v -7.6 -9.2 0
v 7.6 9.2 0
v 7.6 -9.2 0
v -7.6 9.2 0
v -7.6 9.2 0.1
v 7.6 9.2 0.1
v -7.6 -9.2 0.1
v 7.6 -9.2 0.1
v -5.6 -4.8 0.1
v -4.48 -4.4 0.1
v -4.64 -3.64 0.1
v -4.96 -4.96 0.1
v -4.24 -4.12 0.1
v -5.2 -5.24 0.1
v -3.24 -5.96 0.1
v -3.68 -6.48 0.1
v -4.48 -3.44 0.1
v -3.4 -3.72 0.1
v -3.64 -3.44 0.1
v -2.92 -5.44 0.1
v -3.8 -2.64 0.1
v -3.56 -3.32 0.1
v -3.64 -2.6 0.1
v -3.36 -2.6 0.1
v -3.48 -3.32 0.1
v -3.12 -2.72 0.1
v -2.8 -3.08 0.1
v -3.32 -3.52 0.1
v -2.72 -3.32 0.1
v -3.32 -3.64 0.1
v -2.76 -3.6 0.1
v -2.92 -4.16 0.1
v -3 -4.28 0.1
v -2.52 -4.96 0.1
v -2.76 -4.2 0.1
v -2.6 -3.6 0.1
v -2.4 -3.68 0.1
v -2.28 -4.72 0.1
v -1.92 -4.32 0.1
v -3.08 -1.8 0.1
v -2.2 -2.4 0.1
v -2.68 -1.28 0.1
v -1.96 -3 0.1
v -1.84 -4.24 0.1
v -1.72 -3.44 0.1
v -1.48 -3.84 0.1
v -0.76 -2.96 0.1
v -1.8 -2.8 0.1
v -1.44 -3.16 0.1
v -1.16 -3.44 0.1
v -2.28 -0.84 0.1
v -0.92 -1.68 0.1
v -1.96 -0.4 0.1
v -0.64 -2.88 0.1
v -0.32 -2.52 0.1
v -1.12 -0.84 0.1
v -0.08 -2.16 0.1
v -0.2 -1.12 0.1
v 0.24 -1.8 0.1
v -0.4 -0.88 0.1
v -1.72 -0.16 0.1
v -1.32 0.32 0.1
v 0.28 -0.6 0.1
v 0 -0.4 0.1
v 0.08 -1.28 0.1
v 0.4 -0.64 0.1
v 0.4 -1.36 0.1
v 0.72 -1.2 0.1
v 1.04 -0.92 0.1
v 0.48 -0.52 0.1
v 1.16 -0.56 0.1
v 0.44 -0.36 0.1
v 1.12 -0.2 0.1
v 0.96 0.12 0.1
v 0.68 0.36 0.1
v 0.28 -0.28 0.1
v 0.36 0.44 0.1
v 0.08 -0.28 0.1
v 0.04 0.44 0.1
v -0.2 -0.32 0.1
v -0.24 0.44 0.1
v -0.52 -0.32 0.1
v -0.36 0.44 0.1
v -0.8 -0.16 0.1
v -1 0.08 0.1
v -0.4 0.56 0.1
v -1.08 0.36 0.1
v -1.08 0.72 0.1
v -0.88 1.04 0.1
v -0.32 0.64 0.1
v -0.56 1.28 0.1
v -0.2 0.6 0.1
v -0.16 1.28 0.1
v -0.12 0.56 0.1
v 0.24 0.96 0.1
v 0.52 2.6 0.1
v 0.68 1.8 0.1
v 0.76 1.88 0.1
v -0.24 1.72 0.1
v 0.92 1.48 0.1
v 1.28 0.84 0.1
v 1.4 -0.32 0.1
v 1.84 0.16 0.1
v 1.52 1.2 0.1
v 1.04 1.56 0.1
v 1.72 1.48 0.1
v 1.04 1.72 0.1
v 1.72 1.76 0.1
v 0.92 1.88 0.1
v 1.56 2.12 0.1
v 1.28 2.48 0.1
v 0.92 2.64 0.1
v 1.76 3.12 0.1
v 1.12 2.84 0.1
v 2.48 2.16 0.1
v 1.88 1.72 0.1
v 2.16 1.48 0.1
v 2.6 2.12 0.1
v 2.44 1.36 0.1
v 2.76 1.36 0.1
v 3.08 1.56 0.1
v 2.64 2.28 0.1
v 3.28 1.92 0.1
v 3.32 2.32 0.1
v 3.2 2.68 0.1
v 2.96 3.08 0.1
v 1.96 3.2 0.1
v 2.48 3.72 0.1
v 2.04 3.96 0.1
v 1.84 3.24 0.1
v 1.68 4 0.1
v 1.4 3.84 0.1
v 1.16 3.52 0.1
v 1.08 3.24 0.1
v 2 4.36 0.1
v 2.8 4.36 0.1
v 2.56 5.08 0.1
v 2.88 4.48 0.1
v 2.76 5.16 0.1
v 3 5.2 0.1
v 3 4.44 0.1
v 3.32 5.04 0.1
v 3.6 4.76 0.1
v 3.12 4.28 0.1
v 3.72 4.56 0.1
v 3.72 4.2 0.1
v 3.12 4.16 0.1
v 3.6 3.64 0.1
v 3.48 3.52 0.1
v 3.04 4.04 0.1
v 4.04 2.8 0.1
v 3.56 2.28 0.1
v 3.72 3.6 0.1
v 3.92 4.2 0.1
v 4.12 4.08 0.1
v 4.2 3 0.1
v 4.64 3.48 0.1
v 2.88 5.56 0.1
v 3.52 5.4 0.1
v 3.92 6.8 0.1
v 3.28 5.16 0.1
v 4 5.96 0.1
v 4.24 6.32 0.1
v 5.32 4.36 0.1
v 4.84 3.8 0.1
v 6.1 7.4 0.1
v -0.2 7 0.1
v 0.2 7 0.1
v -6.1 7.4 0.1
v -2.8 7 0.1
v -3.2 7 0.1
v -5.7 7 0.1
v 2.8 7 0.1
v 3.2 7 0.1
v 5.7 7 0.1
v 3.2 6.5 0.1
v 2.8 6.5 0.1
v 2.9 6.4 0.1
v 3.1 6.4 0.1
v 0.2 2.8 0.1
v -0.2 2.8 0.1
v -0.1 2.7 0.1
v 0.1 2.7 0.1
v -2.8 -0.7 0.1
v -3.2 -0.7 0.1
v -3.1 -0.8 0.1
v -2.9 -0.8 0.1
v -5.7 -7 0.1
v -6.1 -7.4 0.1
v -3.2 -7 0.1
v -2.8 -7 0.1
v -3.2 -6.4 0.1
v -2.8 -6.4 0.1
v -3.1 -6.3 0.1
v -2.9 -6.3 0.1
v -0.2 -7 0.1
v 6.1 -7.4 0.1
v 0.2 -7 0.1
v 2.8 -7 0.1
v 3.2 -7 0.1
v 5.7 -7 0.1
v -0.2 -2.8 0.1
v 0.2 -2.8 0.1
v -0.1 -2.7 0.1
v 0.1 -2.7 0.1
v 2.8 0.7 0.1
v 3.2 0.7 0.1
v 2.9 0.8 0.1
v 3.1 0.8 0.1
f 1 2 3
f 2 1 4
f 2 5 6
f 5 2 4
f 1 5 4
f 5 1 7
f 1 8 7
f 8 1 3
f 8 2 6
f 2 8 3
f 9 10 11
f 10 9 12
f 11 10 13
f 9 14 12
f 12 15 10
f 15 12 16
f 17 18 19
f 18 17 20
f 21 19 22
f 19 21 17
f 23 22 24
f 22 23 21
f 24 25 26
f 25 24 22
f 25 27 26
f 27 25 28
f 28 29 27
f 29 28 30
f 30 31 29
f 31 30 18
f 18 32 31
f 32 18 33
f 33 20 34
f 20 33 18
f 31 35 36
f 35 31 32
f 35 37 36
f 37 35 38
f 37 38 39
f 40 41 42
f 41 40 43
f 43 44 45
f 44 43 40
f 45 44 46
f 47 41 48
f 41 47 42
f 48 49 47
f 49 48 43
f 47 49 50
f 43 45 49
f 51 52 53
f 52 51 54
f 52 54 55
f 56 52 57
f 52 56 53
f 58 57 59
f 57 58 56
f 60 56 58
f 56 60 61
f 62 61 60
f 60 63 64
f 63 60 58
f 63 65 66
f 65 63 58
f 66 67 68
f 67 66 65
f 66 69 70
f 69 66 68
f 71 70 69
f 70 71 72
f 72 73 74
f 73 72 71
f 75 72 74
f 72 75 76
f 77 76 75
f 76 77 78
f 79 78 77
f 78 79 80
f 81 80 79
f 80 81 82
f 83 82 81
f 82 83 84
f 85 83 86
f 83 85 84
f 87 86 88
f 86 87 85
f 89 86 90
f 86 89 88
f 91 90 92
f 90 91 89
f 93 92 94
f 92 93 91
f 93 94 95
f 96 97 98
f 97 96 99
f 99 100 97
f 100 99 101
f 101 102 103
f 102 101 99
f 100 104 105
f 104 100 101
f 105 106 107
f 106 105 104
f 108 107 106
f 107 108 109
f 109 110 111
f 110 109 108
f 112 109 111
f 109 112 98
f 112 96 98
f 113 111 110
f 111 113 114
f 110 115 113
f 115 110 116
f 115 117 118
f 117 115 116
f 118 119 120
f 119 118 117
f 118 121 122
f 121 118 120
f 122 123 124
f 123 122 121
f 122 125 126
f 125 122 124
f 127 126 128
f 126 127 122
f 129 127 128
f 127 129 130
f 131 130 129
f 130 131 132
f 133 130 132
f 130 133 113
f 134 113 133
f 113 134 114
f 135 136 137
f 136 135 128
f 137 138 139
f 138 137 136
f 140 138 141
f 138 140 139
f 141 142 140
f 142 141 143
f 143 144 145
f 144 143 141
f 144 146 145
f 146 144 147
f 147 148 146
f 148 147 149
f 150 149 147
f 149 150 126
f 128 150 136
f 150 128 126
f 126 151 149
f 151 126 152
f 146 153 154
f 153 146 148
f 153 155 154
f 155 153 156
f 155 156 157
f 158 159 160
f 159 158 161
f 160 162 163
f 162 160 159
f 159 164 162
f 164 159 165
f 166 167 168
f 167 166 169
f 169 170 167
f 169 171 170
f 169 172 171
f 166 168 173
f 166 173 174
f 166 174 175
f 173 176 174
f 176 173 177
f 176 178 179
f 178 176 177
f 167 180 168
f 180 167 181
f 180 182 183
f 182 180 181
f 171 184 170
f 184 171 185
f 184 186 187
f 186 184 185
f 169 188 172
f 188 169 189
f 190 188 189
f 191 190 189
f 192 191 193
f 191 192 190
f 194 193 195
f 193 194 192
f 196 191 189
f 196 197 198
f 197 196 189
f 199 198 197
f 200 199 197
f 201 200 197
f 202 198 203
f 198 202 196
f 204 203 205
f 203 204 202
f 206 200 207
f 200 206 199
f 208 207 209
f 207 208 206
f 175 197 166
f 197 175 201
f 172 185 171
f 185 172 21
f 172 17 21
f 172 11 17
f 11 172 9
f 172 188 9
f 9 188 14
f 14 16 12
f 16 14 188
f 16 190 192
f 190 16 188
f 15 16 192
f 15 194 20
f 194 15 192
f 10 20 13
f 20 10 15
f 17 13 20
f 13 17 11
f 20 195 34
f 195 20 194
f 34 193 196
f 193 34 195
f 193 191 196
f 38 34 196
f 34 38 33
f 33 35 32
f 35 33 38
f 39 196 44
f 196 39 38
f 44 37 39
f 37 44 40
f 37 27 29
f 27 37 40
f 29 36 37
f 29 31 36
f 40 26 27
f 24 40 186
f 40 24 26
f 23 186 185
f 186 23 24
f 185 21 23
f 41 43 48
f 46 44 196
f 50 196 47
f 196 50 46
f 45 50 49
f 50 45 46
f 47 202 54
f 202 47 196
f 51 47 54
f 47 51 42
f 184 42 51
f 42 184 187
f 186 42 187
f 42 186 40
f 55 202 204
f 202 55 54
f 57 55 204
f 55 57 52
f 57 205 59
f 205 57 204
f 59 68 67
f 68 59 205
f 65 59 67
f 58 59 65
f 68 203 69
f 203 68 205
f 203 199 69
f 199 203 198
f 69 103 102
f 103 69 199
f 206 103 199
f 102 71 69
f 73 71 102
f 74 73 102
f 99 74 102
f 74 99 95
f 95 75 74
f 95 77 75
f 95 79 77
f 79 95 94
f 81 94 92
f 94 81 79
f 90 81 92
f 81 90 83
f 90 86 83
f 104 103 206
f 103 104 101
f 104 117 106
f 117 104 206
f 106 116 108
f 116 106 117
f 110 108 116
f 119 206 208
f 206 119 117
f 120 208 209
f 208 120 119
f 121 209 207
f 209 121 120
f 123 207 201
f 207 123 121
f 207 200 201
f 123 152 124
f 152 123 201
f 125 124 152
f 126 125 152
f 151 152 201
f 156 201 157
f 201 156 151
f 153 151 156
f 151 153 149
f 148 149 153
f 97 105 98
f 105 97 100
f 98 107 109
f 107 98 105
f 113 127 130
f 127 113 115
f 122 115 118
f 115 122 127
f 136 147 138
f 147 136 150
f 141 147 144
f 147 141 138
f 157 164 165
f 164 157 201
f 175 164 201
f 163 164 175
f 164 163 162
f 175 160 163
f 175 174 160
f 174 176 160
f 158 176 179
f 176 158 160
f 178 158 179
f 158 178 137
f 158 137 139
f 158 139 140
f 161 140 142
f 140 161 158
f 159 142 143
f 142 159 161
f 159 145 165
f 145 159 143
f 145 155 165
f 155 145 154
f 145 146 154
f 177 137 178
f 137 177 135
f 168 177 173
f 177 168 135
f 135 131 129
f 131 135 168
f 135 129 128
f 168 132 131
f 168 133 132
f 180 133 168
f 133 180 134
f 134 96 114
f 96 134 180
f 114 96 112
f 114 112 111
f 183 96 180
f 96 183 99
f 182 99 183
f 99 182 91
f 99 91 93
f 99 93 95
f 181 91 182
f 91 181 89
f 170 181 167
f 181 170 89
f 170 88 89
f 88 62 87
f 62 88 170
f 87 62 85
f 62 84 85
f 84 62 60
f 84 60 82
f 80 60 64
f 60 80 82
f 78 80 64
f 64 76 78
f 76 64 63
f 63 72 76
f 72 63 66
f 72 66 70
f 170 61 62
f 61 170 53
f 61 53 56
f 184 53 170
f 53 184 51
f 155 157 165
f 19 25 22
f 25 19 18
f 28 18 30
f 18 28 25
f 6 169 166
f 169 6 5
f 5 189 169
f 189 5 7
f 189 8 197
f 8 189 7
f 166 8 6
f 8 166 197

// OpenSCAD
// file: ../p/box5-12.scad
use <../lib.scad>
function ldraw_lib__box5_12() = [
// 0 Box with 5 Faces without Any Edges
// 0 Name: box5-12.dat
// 0 Author: Chris Dee [cwdee]
// 0 !LDRAW_ORG Primitive UPDATE 2009-02
// 0 !LICENSE Licensed under CC BY 2.0 and CC BY 4.0 : see CAreadme.txt
// 
// 0 BFC CERTIFY CCW
  [0,"BFC","CERTIFY"],
  [0,"BFC","CCW"],
// 
// 0 !HISTORY 2009-09-03 [PTadmin] Official Update 2009-02
// 
// 
// 4 16 1 1 1 1 1 -1 -1 1 -1 -1 1 1
  [4,16,1,1,1,1,1,-1,-1,1,-1,-1,1,1],
// 4 16 -1 0 1 1 0 1 1 1 1 -1 1 1
  [4,16,-1,0,1,1,0,1,1,1,1,-1,1,1],
// 4 16 -1 0 -1 -1 0 1 -1 1 1 -1 1 -1
  [4,16,-1,0,-1,-1,0,1,-1,1,1,-1,1,-1],
// 4 16 1 0 -1 -1 0 -1 -1 1 -1 1 1 -1
  [4,16,1,0,-1,-1,0,-1,-1,1,-1,1,1,-1],
// 4 16 1 0 1 1 0 -1 1 1 -1 1 1 1
  [4,16,1,0,1,1,0,-1,1,1,-1,1,1,1],
// 0
];
makepoly(ldraw_lib__box5_12(), line=0.2);
// main file
use <../lib.scad>
use <../p/box5-12.scad>
use <s/3068bp09s01.scad>
use <s/3068bp09s02.scad>
function ldraw_lib__004760b() = [
// 0 Sticker  2.3 x  1.9 with Light Grey "TRANSPORT" on Crate on Yellow Background
// 0 Name: 004760b.dat
// 0 Author: Takeshi Takahashi [RainbowDolphin]
// 0 !LDRAW_ORG Part UPDATE 2022-04
// 0 !LICENSE Licensed under CC BY 2.0 and CC BY 4.0 : see CAreadme.txt
// 
// 0 BFC CERTIFY CCW
  [0,"BFC","CERTIFY"],
  [0,"BFC","CCW"],
// 
// 0 !KEYWORDS Cargo Station, Set 165-1
// 
// 0 !HISTORY 2022-07-18 [PTadmin] Official Update 2022-04
// 
// 
// 1 16 0 -0.25 0 19 0 0 0 0.25 0 0 0 23 box5-12.dat
  [1,16,0,-0.25,0,19,0,0,0,0.25,0,0,0,23, ldraw_lib__box5_12()],
// 1 7 0 -0.25 0 1 0 0 0 1 0 0 0 1 s\3068bp09s01.dat
  [1,7,0,-0.25,0,1,0,0,0,1,0,0,0,1, ldraw_lib__s__3068bp09s01()],
// 1 14 0 -0.25 0 1 0 0 0 1 0 0 0 1 s\3068bp09s02.dat
  [1,14,0,-0.25,0,1,0,0,0,1,0,0,0,1, ldraw_lib__s__3068bp09s02()],
// 4 14 15.25 -0.25 18.5 19 -0.25 23 -19 -0.25 23 -15.25 -0.25 18.5
  [4,14,15.25,-0.25,18.5,19,-0.25,23,-19,-0.25,23,-15.25,-0.25,18.5],
// 4 14 -15.25 -0.25 -18.5 -15.25 -0.25 18.5 -19 -0.25 23 -19 -0.25 -23
  [4,14,-15.25,-0.25,-18.5,-15.25,-0.25,18.5,-19,-0.25,23,-19,-0.25,-23],
// 4 14 15.25 -0.25 -18.5 -15.25 -0.25 -18.5 -19 -0.25 -23 19 -0.25 -23
  [4,14,15.25,-0.25,-18.5,-15.25,-0.25,-18.5,-19,-0.25,-23,19,-0.25,-23],
// 4 14 15.25 -0.25 18.5 15.25 -0.25 -18.5 19 -0.25 -23 19 -0.25 23
  [4,14,15.25,-0.25,18.5,15.25,-0.25,-18.5,19,-0.25,-23,19,-0.25,23],
];
makepoly(ldraw_lib__004760b(), line=0.2);
